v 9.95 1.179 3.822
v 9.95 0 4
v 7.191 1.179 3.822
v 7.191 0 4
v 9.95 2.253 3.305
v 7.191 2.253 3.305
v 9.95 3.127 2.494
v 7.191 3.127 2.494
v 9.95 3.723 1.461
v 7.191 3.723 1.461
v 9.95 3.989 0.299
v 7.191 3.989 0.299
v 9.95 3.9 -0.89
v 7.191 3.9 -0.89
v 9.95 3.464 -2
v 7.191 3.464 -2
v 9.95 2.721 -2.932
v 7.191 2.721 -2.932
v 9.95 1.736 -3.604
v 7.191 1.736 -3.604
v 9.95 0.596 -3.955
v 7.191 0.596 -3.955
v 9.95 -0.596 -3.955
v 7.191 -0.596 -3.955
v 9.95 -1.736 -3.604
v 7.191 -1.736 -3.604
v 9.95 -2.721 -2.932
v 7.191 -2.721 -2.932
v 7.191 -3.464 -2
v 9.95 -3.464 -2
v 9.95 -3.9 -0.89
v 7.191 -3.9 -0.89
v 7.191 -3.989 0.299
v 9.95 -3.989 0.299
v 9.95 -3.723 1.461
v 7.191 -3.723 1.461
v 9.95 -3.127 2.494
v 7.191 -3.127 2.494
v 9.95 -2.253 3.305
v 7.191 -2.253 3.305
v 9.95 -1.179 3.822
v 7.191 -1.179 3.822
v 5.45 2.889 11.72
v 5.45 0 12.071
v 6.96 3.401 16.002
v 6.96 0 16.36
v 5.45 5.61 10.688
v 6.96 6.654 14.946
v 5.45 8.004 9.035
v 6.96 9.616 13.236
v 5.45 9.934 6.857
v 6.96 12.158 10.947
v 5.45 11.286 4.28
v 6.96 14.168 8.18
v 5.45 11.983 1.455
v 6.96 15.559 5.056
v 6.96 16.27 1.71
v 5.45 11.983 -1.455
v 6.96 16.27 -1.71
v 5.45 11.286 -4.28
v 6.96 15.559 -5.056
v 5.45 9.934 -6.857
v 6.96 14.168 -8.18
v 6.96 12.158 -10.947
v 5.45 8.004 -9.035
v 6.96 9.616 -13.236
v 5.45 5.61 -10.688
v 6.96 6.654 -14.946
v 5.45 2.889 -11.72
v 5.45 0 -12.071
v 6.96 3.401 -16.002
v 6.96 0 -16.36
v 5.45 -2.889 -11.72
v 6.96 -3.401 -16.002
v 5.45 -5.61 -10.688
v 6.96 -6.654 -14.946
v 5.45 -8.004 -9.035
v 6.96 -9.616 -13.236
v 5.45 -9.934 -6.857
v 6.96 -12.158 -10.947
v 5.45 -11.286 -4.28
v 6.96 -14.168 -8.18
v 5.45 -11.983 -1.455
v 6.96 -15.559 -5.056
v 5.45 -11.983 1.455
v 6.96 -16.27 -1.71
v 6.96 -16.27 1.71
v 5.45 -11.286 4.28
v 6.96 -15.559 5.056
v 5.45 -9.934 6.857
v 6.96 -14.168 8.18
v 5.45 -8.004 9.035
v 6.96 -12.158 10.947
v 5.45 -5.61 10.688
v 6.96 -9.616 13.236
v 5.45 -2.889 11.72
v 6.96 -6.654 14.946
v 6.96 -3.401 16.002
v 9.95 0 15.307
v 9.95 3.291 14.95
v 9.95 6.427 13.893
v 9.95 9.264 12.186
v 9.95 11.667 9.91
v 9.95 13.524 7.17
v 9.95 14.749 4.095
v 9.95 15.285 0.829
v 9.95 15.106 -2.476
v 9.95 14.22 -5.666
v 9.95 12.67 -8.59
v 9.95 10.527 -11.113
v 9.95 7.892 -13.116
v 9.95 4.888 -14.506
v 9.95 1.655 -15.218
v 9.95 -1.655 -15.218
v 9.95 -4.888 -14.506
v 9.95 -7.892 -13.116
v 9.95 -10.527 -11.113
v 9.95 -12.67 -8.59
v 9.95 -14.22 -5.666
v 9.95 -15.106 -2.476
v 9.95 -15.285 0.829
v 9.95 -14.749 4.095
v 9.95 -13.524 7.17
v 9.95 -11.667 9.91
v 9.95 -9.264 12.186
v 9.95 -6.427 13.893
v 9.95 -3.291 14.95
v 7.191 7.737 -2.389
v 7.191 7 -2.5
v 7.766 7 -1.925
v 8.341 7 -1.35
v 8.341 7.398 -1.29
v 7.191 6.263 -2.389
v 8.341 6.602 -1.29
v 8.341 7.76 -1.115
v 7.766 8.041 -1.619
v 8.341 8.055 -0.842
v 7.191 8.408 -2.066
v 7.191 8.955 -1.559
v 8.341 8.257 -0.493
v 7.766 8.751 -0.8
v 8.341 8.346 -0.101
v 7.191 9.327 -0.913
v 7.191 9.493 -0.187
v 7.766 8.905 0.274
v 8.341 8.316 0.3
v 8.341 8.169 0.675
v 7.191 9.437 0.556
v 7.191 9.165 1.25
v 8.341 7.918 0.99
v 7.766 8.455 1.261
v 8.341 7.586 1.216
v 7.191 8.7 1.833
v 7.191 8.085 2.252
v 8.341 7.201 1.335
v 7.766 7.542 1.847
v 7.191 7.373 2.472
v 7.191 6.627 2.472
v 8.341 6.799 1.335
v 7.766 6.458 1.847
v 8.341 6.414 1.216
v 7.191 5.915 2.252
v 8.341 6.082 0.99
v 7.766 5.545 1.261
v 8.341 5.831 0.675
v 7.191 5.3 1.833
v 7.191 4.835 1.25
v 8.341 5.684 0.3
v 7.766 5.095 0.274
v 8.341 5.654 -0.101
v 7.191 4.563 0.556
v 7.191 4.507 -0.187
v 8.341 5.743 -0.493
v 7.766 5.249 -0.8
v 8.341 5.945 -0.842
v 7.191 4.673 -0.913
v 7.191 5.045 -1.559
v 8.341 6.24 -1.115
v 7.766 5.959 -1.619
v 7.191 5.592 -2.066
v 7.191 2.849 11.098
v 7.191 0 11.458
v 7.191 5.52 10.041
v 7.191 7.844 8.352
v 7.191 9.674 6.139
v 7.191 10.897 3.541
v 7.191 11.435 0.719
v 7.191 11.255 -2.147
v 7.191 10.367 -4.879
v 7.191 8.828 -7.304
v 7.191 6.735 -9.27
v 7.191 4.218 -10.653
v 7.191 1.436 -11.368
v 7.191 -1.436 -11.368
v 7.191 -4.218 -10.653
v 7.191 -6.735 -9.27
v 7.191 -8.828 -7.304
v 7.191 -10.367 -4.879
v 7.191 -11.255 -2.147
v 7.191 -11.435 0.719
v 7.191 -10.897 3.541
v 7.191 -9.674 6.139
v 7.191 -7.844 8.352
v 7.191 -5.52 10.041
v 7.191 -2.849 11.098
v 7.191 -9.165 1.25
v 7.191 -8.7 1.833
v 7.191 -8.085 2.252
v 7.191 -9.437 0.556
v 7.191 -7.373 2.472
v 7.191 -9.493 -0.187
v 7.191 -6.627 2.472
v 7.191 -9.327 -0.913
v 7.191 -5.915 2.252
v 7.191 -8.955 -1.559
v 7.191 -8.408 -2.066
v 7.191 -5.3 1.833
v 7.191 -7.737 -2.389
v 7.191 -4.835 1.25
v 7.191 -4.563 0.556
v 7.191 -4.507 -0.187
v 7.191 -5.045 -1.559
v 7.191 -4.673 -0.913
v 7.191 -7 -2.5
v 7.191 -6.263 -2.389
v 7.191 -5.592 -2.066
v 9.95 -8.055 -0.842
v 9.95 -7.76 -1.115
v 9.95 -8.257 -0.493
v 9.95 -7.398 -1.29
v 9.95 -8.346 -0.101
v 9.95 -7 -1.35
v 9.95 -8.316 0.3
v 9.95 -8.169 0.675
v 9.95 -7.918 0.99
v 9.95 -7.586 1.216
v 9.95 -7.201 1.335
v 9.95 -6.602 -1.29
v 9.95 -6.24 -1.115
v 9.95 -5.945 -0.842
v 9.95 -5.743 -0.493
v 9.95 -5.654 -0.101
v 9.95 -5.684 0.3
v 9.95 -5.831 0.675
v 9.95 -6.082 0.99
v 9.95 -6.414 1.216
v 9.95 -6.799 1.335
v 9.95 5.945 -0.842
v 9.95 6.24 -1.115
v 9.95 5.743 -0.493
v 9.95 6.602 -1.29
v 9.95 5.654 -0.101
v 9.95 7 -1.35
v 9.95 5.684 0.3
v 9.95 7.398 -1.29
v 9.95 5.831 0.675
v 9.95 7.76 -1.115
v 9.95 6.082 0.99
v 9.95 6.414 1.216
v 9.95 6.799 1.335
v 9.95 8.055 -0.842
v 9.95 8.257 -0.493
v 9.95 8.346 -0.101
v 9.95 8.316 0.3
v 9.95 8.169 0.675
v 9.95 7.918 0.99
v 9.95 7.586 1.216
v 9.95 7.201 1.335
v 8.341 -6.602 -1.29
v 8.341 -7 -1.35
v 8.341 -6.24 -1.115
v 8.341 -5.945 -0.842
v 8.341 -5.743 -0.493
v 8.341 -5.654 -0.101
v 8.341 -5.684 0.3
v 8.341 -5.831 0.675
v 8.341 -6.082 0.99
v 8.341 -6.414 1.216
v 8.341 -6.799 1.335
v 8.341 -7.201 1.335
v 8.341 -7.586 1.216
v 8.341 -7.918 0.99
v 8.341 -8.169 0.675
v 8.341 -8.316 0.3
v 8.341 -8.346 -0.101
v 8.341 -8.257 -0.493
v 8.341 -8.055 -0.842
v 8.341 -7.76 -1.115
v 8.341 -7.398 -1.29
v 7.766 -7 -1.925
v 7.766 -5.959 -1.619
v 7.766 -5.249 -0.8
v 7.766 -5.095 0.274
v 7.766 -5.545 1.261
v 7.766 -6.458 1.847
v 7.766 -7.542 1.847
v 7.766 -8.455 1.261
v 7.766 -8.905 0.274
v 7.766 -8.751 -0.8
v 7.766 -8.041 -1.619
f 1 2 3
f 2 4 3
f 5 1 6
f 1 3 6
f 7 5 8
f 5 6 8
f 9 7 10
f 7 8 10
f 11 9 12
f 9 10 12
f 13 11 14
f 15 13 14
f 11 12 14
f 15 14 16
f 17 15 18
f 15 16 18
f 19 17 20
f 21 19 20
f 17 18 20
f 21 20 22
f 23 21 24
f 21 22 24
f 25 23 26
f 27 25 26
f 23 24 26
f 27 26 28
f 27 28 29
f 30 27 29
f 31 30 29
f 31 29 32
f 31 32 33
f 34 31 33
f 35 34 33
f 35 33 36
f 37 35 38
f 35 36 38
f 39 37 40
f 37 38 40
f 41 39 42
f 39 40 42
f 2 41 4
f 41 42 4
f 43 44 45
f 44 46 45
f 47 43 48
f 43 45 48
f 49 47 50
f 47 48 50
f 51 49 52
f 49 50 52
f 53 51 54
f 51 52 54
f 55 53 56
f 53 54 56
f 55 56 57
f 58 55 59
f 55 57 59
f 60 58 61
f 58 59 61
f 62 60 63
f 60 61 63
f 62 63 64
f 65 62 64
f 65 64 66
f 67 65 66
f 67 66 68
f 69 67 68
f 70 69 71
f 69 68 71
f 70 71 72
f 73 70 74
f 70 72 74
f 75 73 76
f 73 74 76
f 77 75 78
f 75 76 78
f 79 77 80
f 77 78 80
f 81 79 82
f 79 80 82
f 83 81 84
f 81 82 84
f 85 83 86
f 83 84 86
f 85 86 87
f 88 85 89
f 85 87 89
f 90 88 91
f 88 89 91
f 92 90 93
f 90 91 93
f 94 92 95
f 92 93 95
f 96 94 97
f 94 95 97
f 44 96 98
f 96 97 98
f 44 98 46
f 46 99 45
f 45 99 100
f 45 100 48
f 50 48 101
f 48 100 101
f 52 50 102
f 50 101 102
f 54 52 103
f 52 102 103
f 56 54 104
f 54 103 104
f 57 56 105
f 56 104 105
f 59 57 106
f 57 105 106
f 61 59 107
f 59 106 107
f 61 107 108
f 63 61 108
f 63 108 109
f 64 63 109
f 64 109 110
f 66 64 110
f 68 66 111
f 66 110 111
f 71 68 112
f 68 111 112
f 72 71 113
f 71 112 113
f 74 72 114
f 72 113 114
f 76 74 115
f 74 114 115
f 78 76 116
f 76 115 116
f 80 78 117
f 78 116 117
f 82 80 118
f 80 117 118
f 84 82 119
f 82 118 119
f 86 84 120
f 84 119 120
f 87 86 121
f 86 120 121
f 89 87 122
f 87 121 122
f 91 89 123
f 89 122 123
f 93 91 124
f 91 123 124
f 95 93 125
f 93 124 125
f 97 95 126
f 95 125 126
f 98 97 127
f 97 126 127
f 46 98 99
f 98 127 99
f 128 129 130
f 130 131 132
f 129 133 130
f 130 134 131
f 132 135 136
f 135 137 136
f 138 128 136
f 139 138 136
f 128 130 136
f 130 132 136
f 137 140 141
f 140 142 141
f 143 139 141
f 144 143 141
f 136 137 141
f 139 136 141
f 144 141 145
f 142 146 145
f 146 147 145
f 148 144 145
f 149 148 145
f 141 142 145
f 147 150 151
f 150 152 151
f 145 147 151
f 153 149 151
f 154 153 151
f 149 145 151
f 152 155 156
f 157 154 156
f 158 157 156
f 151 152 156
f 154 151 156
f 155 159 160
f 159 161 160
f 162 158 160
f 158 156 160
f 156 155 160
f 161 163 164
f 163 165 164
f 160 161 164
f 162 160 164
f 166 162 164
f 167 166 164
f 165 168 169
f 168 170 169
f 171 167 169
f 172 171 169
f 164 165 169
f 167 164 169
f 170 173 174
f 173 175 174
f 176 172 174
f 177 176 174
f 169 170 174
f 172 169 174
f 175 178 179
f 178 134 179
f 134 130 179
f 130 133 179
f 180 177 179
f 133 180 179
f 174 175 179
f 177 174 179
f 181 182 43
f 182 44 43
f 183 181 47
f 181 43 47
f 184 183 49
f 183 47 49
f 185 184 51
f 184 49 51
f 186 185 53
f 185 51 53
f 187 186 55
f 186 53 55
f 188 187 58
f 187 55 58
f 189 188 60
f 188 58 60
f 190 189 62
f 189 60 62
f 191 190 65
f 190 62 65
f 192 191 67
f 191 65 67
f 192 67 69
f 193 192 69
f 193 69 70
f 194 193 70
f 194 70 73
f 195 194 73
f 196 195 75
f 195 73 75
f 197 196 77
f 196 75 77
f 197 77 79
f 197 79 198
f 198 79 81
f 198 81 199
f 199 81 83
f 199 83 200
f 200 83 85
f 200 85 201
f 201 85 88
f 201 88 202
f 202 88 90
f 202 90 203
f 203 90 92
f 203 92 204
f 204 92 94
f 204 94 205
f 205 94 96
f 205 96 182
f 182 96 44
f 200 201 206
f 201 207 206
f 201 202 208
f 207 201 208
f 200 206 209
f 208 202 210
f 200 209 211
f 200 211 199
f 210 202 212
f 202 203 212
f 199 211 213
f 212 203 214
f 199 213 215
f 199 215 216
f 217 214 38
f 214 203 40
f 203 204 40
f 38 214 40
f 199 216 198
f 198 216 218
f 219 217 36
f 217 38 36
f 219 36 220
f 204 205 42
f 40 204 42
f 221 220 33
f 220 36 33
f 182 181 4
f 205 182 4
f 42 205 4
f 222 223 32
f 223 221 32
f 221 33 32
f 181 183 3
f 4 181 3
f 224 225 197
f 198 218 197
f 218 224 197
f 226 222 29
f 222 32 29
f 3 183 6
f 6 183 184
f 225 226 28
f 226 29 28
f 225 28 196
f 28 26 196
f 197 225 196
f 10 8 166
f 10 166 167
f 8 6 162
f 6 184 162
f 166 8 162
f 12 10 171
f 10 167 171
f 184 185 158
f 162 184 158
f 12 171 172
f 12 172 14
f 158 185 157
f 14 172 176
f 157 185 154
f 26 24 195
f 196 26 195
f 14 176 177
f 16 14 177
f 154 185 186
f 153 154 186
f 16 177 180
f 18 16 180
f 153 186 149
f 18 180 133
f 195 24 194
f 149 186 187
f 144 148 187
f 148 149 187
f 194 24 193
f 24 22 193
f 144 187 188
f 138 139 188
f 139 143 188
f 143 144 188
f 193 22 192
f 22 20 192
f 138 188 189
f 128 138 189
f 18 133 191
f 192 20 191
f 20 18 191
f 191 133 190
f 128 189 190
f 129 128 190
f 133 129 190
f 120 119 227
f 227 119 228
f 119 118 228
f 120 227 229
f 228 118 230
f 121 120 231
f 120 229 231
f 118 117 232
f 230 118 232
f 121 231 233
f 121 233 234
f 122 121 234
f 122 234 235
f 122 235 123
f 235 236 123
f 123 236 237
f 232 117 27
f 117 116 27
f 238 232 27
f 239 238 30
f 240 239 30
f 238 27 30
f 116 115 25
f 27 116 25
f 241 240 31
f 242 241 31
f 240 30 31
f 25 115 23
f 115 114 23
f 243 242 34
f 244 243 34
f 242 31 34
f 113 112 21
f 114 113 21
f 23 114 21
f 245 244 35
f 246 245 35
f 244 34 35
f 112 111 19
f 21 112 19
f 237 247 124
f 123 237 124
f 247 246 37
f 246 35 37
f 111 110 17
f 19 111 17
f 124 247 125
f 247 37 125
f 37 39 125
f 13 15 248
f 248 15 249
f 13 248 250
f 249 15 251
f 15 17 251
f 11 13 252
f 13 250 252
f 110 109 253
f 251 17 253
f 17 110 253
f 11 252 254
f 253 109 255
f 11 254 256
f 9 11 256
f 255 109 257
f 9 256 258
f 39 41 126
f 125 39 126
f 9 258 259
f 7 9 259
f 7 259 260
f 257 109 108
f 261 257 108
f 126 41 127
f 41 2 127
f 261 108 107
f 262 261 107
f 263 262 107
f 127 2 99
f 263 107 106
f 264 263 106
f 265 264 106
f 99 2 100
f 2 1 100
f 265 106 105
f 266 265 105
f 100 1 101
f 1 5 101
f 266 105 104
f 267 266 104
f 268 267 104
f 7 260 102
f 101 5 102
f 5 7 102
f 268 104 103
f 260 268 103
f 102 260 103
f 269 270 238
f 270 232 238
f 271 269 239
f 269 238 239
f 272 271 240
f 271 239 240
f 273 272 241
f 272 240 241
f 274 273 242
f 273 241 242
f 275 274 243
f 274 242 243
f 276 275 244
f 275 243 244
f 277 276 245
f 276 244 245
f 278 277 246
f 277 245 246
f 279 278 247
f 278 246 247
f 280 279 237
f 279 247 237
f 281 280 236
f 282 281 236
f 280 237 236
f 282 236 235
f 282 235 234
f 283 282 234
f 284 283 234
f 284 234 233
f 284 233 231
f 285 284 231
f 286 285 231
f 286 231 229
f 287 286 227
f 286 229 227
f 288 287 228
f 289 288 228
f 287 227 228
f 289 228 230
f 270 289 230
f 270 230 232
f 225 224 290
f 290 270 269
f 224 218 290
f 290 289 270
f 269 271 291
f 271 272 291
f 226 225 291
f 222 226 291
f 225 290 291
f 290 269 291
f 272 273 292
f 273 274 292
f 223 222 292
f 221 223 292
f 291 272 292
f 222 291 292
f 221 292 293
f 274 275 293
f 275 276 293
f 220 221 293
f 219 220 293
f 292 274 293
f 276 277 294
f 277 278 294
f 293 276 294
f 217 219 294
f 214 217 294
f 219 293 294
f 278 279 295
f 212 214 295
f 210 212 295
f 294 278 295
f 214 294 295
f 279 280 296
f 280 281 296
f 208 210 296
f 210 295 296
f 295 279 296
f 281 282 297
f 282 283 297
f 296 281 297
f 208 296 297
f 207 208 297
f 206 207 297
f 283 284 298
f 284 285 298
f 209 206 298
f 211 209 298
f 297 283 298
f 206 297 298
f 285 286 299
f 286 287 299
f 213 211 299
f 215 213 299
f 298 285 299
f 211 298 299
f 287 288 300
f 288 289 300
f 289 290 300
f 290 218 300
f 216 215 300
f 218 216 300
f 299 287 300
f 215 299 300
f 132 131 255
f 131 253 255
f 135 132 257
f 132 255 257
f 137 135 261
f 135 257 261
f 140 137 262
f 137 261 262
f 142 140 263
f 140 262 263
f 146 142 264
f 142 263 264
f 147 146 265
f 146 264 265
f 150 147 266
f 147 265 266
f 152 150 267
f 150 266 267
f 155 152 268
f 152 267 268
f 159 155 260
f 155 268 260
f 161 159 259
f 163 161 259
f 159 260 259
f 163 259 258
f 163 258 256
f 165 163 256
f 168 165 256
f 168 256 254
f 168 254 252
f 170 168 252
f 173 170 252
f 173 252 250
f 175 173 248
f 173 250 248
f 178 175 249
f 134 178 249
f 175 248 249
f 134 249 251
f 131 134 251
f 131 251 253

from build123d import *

# Parameters (mm, degrees)
CSK_FOR_M3_FLAT_COUNTERSUNK_HEAD_SCREW1_D           = 2.7
CSK_FOR_M3_FLAT_COUNTERSUNK_HEAD_SCREW1_CSINK_D     = 5
CSK_FOR_M3_FLAT_COUNTERSUNK_HEAD_SCREW1_CSINK_ANGLE = 90


with BuildPart() as part:
    # Sketch1 → Revolve1 (revolve)
    with BuildSketch(Plane(origin=(0, 0, 0), x_dir=(-1, 0, 0), z_dir=(0, 0, -1)), mode=Mode.PRIVATE) as revolve1_sk:
        Polygon((-9.95, 4), (-7.190575715, 4), (-7.190575715, 11.457942816), (-5.45, 12.070691824), (-6.96, 16.36), (-9.95, 15.307406012), align=None)
    revolve(revolve1_sk.sketch.rotate(Axis((15.476540881, 0, 0), (-1, 0, 0)), 270), axis=Axis((15.476540881, 0, 0), (-1, 0, 0)))

    # CSK for M3 Flat Countersunk Head Screw1 (through all)
    with Locations(Plane.ZY.offset(-7.190575715)):
        with Locations((0, 7), (0, -7)):
            CounterSinkHole(CSK_FOR_M3_FLAT_COUNTERSUNK_HEAD_SCREW1_D / 2, CSK_FOR_M3_FLAT_COUNTERSUNK_HEAD_SCREW1_CSINK_D / 2, counter_sink_angle=CSK_FOR_M3_FLAT_COUNTERSUNK_HEAD_SCREW1_CSINK_ANGLE)


solid = part.part
